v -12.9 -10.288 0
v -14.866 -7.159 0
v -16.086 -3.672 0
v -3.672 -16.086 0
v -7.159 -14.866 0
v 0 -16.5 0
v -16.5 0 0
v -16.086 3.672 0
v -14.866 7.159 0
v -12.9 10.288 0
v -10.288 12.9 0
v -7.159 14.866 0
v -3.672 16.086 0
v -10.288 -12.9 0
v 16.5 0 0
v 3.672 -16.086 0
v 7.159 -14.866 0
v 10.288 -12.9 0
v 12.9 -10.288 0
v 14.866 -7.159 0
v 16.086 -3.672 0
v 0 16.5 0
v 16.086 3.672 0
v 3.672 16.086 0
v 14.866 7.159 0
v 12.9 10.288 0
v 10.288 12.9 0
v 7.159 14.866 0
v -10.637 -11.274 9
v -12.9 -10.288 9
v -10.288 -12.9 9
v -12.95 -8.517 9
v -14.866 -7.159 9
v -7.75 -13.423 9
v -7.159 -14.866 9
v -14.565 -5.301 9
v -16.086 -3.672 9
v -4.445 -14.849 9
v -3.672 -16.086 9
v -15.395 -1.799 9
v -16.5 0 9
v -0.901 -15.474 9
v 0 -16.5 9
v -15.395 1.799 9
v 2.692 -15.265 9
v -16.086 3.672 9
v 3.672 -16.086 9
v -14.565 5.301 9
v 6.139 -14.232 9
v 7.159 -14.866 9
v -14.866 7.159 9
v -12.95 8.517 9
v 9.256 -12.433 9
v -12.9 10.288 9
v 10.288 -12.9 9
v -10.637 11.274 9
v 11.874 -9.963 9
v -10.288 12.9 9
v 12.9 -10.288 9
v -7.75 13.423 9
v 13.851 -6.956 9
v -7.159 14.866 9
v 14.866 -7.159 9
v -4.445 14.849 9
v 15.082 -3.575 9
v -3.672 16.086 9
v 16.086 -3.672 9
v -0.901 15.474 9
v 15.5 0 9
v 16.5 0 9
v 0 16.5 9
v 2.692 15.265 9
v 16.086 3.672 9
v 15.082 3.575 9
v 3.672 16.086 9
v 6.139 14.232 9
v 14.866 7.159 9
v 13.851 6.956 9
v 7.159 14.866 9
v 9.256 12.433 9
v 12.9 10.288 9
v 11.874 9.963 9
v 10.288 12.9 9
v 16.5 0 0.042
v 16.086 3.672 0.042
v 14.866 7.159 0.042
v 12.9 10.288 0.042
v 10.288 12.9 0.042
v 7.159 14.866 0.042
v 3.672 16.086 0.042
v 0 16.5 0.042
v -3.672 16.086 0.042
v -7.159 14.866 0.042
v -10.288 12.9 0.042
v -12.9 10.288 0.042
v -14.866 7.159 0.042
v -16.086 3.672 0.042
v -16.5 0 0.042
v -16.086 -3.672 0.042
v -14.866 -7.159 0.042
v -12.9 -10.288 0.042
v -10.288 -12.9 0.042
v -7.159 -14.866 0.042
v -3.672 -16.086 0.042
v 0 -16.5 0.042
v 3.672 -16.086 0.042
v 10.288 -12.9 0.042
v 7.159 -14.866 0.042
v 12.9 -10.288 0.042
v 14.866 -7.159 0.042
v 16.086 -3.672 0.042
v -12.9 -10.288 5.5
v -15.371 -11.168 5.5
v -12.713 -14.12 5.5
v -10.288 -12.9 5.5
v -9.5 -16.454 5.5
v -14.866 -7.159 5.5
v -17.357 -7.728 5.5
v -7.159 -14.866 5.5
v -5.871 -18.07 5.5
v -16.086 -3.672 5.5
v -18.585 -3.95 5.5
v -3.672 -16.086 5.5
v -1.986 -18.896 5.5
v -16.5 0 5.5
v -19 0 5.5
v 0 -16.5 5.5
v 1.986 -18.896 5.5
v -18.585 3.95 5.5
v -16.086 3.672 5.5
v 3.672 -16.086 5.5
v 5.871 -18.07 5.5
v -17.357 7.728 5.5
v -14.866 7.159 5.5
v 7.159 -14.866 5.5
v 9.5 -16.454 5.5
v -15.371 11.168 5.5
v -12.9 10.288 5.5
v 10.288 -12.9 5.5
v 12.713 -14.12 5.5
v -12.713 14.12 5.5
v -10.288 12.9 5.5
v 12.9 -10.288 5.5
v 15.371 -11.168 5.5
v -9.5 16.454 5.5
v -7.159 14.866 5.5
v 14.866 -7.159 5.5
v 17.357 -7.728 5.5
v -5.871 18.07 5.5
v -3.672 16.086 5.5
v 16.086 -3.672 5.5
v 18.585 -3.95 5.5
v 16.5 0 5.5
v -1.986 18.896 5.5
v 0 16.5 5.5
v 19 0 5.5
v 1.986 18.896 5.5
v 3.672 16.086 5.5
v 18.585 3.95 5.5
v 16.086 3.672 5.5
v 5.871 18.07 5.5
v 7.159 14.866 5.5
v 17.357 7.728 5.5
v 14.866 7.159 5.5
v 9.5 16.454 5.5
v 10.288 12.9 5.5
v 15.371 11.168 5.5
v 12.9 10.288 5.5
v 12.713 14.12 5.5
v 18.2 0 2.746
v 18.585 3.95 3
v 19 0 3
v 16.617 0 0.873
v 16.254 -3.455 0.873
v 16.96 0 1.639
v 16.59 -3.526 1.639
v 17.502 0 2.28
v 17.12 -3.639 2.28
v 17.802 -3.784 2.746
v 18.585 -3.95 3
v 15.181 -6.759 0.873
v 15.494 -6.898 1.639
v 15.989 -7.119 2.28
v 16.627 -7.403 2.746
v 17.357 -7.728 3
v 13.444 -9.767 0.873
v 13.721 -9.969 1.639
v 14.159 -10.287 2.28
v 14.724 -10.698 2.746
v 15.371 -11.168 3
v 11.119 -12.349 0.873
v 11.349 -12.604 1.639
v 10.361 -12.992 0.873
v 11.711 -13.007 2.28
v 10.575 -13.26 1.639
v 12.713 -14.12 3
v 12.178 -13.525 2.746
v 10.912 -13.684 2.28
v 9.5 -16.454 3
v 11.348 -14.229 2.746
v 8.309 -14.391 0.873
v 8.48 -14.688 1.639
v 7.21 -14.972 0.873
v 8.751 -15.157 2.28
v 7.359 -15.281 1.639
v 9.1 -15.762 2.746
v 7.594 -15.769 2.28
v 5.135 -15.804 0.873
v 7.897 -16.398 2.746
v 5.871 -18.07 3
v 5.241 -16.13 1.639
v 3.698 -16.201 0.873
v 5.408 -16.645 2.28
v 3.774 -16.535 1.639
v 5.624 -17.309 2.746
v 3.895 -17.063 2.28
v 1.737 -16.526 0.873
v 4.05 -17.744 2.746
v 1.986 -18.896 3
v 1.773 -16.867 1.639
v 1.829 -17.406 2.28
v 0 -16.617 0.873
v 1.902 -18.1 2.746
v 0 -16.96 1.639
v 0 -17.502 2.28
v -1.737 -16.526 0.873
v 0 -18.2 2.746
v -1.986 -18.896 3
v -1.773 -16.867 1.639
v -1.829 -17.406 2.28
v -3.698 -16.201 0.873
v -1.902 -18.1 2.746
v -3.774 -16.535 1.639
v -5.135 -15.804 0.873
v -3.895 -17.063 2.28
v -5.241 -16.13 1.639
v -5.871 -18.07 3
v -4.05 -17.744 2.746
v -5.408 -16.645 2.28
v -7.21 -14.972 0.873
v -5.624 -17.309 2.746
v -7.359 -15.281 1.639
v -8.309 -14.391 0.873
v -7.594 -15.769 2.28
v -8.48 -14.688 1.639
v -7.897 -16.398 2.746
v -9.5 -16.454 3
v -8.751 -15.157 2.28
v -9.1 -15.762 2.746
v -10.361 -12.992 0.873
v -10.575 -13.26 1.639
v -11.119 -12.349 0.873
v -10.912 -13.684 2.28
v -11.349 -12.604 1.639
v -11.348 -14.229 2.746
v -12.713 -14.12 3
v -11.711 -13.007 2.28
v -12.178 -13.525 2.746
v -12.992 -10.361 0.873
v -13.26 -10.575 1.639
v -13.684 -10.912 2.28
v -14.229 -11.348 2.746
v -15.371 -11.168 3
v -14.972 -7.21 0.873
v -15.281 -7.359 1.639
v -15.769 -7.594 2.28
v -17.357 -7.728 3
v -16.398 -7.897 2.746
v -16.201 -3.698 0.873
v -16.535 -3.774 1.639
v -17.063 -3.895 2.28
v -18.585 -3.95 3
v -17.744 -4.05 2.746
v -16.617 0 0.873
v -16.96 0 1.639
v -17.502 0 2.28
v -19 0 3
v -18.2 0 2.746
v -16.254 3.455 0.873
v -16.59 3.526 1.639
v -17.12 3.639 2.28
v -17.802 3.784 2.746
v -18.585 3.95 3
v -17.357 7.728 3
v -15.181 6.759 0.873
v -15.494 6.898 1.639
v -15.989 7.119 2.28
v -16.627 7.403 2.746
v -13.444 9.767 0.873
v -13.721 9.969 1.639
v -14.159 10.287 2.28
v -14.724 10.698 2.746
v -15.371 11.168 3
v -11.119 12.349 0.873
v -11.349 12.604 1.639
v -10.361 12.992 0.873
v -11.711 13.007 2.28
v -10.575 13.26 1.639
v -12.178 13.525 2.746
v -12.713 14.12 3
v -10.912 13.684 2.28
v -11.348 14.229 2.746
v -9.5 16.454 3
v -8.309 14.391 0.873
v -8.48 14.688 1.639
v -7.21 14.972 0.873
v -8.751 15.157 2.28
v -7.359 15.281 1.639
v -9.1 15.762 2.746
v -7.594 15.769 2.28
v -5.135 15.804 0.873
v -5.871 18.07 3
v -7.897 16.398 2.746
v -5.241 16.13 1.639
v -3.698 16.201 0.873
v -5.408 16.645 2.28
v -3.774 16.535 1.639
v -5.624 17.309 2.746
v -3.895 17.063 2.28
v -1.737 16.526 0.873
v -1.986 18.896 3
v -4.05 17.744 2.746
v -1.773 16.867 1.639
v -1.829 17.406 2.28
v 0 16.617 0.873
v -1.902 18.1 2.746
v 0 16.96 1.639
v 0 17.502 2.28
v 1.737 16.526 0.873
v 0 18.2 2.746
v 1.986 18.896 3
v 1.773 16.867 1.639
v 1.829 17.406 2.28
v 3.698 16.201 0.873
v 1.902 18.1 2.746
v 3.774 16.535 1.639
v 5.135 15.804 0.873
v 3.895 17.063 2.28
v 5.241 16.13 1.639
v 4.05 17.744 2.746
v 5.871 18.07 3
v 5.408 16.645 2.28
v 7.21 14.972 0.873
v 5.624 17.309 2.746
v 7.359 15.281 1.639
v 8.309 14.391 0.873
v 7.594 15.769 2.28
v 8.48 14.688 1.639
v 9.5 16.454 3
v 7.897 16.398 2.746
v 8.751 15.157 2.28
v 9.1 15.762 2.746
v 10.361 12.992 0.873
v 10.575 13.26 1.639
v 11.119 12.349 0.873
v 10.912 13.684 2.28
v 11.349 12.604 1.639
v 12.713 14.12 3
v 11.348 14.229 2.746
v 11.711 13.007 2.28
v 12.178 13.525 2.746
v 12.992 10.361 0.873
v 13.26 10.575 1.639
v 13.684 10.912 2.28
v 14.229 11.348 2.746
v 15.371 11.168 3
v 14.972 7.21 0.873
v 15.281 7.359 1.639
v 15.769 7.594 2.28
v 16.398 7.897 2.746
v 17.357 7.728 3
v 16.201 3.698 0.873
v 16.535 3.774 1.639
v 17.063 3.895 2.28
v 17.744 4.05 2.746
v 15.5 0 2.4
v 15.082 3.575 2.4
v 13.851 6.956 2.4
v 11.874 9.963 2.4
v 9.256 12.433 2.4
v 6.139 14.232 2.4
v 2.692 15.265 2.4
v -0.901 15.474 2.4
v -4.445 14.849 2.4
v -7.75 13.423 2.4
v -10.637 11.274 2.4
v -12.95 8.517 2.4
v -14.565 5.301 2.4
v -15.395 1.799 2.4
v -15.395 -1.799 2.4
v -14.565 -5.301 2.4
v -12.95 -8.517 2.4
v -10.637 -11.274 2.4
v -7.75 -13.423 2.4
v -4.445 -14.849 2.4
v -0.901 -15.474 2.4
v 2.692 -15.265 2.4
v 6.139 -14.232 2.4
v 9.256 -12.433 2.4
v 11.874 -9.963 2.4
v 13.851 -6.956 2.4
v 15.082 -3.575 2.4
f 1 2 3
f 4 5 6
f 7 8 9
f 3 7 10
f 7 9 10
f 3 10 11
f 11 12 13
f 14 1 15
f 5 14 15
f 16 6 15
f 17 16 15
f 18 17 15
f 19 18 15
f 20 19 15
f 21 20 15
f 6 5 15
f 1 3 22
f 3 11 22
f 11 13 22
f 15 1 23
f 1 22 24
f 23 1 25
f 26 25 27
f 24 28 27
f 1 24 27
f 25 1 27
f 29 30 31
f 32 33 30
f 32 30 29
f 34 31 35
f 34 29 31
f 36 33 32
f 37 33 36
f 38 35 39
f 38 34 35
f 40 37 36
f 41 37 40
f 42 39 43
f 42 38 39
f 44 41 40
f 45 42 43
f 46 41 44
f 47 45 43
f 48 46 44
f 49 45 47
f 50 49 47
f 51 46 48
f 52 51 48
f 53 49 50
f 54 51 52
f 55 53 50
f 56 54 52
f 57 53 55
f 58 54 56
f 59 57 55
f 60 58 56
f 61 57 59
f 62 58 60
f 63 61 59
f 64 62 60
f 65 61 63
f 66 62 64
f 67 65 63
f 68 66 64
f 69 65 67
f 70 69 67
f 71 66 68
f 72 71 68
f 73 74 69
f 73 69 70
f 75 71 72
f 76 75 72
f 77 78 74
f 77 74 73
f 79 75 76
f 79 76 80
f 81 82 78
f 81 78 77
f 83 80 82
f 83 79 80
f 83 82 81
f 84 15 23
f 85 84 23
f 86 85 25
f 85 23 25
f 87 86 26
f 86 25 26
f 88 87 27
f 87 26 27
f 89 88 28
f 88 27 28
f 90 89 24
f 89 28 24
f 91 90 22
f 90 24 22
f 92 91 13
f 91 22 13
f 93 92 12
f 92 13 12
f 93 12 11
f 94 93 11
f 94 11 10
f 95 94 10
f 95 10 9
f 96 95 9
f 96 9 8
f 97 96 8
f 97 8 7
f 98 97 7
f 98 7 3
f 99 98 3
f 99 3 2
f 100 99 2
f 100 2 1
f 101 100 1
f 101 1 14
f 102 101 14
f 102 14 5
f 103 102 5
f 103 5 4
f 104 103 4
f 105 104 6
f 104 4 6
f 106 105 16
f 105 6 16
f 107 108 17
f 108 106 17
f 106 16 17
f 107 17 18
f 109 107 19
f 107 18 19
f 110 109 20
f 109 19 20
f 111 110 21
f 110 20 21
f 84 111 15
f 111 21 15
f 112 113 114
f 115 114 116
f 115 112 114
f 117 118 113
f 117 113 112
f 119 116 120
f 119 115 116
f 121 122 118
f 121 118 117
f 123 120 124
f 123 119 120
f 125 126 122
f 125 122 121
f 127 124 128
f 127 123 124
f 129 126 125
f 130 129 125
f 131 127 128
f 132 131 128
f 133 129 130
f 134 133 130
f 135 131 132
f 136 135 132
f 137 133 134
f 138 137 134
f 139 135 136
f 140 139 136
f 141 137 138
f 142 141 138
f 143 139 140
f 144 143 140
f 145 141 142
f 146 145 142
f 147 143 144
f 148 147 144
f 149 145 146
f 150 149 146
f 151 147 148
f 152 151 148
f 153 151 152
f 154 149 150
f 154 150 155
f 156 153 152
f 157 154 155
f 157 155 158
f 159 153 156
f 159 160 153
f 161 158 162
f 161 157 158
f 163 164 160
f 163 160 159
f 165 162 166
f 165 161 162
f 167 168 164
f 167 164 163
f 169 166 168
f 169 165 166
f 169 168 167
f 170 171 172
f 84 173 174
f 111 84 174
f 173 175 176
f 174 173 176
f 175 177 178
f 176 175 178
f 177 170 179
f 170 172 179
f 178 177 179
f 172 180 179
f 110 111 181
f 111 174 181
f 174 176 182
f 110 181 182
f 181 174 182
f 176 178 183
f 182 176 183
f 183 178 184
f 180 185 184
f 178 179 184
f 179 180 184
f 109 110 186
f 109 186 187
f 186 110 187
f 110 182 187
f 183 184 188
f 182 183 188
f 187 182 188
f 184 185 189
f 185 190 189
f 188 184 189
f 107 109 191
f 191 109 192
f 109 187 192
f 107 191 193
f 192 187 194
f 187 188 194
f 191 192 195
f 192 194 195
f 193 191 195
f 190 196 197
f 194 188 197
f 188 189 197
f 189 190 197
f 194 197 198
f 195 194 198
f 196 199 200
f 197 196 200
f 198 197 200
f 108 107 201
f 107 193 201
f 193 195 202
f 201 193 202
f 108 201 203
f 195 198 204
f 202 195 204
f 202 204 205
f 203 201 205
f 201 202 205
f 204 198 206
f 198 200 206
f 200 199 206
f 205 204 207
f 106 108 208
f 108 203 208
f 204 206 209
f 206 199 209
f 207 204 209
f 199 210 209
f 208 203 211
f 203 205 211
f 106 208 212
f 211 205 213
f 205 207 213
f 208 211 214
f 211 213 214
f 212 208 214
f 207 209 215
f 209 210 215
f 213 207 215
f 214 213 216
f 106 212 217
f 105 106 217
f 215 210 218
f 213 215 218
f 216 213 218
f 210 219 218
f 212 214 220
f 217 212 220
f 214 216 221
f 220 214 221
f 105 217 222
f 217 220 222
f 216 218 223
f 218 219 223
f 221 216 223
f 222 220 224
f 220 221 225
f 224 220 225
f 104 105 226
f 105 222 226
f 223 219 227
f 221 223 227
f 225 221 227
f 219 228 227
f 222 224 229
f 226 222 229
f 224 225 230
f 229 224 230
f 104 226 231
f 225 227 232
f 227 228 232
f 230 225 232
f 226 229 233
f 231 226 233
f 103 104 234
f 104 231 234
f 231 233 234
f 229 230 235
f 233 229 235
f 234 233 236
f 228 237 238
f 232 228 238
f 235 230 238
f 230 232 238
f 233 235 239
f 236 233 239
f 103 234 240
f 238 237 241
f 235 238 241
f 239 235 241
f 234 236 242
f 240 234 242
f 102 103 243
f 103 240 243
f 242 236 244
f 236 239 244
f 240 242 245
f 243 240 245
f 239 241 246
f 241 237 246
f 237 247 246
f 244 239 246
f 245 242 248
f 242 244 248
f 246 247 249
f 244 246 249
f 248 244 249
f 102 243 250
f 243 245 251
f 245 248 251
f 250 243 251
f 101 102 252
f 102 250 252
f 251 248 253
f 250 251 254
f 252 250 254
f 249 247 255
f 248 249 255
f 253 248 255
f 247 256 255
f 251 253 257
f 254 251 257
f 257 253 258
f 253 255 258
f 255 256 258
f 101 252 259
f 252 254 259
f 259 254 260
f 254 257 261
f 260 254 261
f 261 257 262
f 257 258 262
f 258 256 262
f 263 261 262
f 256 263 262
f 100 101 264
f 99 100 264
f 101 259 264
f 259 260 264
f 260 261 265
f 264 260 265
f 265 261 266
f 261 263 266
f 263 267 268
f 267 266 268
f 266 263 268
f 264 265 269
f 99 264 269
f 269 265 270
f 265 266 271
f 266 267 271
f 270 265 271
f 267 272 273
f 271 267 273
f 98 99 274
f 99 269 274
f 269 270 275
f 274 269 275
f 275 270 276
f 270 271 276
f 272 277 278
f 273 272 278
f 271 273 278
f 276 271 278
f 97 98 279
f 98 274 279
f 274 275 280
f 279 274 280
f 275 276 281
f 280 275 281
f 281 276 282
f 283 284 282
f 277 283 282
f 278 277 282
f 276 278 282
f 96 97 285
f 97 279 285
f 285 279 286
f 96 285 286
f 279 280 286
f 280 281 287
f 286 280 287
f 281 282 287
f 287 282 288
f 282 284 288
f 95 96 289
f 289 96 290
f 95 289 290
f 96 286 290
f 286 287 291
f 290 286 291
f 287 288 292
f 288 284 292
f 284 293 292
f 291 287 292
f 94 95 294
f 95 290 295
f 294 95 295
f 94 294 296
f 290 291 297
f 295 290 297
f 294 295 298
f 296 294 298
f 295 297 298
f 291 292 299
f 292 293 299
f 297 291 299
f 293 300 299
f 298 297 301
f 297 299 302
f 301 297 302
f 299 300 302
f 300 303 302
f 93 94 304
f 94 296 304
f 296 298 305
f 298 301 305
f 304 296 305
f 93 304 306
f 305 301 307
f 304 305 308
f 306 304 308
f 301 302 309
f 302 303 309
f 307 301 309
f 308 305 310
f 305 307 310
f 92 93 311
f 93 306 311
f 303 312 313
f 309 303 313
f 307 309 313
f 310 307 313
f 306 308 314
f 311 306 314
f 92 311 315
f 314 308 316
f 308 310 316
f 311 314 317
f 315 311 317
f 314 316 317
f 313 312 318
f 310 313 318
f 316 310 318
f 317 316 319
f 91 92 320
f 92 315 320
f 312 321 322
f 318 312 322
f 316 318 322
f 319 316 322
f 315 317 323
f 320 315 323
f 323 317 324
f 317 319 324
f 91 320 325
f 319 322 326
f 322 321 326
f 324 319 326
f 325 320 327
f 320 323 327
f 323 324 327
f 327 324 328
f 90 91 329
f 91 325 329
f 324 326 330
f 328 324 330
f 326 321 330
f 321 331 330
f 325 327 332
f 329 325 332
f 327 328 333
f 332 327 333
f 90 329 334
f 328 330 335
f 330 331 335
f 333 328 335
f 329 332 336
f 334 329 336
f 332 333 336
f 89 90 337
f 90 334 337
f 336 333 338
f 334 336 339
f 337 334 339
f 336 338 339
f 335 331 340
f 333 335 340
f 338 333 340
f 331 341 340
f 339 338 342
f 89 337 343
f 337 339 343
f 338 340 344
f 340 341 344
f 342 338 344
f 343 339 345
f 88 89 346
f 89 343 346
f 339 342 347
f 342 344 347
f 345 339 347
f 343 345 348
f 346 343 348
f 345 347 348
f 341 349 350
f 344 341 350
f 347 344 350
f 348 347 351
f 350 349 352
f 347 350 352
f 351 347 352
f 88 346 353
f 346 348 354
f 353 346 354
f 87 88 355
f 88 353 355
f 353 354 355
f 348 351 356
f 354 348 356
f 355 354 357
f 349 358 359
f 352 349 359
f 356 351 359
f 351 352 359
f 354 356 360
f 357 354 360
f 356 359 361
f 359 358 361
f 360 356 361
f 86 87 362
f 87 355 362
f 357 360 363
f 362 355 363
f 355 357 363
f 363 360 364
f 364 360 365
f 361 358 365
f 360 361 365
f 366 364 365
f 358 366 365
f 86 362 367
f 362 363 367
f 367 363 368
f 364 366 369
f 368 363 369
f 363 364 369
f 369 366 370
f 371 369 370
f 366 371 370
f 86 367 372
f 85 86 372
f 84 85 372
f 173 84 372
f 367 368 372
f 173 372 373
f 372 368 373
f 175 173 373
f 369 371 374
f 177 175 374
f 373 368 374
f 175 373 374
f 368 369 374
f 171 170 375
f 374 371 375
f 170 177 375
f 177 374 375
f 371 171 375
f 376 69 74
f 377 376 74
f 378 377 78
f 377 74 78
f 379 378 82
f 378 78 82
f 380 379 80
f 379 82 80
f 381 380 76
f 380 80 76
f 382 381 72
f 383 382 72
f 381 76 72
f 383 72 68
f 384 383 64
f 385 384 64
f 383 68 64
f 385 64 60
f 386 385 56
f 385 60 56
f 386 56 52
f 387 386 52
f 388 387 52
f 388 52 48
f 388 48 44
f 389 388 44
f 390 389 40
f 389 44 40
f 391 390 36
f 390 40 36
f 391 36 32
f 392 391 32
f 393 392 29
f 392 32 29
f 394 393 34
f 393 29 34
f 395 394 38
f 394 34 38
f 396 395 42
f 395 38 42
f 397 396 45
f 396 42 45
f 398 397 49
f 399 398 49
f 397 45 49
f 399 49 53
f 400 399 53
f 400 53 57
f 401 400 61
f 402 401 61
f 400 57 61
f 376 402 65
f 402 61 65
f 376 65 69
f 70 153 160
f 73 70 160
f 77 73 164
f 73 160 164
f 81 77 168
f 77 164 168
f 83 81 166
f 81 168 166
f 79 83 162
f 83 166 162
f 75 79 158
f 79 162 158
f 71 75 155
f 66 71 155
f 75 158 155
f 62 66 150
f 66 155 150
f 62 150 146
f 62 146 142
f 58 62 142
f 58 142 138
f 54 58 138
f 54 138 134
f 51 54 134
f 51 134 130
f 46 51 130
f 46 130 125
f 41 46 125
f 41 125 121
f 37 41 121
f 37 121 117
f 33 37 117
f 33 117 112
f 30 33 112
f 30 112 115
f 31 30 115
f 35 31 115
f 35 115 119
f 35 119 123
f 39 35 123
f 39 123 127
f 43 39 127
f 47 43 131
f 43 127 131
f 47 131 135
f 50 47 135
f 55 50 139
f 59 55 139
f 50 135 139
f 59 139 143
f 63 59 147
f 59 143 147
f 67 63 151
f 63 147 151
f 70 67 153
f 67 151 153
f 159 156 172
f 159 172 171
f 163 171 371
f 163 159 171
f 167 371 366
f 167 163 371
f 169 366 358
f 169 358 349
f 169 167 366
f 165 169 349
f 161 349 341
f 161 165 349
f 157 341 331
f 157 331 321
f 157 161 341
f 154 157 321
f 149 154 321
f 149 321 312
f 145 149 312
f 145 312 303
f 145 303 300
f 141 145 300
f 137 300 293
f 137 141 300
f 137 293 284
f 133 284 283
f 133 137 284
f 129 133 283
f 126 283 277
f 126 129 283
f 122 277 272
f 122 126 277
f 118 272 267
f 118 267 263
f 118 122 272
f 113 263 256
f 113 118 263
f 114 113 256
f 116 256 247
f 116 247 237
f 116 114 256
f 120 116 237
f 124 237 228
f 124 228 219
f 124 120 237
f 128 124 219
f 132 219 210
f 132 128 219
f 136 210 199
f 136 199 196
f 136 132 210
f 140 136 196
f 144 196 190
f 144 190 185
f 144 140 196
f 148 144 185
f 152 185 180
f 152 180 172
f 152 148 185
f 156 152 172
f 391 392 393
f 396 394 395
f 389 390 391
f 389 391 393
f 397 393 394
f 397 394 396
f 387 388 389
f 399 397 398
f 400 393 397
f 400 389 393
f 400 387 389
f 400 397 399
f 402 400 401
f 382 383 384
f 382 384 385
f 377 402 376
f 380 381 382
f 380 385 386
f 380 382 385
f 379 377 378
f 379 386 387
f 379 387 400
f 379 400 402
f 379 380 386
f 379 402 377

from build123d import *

# Parameters (mm, degrees)
F0_R     = 16.5
F1_DEPTH = 9
F4_R     = 19
F5_DEPTH = 2.5
F2_R     = 15.5
F6_DEPTH = 6.6


# Not quite as in the source:
# - a fillet or chamfer that OpenCascade refuses, or shapes differently, is made with other operations: its cross-section is extruded or revolved along the edge and cut away or added


with BuildPart() as f1:
    # F0 (on Top) → F1 (new body)
    with BuildSketch(Plane.XY):
        Circle(F0_R)
    extrude(amount=F1_DEPTH)

    # F4 (on offset) → F5 (join)
    with BuildSketch(Plane.XY.offset(5.5)):
        Circle(F4_R)
    extrude(amount=-F5_DEPTH)

    # F2 (on face) → F6 (cut)
    with BuildSketch(Plane.XY.offset(9)):
        Circle(F2_R)
    extrude(amount=-F6_DEPTH, mode=Mode.SUBTRACT)

    # F7: fillet of radius 3 on 1 edges, made by hand

    # F7_s1 → F7_t2 (revolve)
    with BuildSketch(Plane.XZ):
        with BuildLine():
            ThreePointArc((16.5, 0.0419601084), (17.2087121525, 1.9784517816), (19, 3))
            Line((19, 3), (16.5, 3))
            Line((16.5, 3), (16.5, 0.0419601084))
        make_face()
    revolve(axis=Axis((0, 0, 3), (0, 0, -1)))


solid = f1.part
